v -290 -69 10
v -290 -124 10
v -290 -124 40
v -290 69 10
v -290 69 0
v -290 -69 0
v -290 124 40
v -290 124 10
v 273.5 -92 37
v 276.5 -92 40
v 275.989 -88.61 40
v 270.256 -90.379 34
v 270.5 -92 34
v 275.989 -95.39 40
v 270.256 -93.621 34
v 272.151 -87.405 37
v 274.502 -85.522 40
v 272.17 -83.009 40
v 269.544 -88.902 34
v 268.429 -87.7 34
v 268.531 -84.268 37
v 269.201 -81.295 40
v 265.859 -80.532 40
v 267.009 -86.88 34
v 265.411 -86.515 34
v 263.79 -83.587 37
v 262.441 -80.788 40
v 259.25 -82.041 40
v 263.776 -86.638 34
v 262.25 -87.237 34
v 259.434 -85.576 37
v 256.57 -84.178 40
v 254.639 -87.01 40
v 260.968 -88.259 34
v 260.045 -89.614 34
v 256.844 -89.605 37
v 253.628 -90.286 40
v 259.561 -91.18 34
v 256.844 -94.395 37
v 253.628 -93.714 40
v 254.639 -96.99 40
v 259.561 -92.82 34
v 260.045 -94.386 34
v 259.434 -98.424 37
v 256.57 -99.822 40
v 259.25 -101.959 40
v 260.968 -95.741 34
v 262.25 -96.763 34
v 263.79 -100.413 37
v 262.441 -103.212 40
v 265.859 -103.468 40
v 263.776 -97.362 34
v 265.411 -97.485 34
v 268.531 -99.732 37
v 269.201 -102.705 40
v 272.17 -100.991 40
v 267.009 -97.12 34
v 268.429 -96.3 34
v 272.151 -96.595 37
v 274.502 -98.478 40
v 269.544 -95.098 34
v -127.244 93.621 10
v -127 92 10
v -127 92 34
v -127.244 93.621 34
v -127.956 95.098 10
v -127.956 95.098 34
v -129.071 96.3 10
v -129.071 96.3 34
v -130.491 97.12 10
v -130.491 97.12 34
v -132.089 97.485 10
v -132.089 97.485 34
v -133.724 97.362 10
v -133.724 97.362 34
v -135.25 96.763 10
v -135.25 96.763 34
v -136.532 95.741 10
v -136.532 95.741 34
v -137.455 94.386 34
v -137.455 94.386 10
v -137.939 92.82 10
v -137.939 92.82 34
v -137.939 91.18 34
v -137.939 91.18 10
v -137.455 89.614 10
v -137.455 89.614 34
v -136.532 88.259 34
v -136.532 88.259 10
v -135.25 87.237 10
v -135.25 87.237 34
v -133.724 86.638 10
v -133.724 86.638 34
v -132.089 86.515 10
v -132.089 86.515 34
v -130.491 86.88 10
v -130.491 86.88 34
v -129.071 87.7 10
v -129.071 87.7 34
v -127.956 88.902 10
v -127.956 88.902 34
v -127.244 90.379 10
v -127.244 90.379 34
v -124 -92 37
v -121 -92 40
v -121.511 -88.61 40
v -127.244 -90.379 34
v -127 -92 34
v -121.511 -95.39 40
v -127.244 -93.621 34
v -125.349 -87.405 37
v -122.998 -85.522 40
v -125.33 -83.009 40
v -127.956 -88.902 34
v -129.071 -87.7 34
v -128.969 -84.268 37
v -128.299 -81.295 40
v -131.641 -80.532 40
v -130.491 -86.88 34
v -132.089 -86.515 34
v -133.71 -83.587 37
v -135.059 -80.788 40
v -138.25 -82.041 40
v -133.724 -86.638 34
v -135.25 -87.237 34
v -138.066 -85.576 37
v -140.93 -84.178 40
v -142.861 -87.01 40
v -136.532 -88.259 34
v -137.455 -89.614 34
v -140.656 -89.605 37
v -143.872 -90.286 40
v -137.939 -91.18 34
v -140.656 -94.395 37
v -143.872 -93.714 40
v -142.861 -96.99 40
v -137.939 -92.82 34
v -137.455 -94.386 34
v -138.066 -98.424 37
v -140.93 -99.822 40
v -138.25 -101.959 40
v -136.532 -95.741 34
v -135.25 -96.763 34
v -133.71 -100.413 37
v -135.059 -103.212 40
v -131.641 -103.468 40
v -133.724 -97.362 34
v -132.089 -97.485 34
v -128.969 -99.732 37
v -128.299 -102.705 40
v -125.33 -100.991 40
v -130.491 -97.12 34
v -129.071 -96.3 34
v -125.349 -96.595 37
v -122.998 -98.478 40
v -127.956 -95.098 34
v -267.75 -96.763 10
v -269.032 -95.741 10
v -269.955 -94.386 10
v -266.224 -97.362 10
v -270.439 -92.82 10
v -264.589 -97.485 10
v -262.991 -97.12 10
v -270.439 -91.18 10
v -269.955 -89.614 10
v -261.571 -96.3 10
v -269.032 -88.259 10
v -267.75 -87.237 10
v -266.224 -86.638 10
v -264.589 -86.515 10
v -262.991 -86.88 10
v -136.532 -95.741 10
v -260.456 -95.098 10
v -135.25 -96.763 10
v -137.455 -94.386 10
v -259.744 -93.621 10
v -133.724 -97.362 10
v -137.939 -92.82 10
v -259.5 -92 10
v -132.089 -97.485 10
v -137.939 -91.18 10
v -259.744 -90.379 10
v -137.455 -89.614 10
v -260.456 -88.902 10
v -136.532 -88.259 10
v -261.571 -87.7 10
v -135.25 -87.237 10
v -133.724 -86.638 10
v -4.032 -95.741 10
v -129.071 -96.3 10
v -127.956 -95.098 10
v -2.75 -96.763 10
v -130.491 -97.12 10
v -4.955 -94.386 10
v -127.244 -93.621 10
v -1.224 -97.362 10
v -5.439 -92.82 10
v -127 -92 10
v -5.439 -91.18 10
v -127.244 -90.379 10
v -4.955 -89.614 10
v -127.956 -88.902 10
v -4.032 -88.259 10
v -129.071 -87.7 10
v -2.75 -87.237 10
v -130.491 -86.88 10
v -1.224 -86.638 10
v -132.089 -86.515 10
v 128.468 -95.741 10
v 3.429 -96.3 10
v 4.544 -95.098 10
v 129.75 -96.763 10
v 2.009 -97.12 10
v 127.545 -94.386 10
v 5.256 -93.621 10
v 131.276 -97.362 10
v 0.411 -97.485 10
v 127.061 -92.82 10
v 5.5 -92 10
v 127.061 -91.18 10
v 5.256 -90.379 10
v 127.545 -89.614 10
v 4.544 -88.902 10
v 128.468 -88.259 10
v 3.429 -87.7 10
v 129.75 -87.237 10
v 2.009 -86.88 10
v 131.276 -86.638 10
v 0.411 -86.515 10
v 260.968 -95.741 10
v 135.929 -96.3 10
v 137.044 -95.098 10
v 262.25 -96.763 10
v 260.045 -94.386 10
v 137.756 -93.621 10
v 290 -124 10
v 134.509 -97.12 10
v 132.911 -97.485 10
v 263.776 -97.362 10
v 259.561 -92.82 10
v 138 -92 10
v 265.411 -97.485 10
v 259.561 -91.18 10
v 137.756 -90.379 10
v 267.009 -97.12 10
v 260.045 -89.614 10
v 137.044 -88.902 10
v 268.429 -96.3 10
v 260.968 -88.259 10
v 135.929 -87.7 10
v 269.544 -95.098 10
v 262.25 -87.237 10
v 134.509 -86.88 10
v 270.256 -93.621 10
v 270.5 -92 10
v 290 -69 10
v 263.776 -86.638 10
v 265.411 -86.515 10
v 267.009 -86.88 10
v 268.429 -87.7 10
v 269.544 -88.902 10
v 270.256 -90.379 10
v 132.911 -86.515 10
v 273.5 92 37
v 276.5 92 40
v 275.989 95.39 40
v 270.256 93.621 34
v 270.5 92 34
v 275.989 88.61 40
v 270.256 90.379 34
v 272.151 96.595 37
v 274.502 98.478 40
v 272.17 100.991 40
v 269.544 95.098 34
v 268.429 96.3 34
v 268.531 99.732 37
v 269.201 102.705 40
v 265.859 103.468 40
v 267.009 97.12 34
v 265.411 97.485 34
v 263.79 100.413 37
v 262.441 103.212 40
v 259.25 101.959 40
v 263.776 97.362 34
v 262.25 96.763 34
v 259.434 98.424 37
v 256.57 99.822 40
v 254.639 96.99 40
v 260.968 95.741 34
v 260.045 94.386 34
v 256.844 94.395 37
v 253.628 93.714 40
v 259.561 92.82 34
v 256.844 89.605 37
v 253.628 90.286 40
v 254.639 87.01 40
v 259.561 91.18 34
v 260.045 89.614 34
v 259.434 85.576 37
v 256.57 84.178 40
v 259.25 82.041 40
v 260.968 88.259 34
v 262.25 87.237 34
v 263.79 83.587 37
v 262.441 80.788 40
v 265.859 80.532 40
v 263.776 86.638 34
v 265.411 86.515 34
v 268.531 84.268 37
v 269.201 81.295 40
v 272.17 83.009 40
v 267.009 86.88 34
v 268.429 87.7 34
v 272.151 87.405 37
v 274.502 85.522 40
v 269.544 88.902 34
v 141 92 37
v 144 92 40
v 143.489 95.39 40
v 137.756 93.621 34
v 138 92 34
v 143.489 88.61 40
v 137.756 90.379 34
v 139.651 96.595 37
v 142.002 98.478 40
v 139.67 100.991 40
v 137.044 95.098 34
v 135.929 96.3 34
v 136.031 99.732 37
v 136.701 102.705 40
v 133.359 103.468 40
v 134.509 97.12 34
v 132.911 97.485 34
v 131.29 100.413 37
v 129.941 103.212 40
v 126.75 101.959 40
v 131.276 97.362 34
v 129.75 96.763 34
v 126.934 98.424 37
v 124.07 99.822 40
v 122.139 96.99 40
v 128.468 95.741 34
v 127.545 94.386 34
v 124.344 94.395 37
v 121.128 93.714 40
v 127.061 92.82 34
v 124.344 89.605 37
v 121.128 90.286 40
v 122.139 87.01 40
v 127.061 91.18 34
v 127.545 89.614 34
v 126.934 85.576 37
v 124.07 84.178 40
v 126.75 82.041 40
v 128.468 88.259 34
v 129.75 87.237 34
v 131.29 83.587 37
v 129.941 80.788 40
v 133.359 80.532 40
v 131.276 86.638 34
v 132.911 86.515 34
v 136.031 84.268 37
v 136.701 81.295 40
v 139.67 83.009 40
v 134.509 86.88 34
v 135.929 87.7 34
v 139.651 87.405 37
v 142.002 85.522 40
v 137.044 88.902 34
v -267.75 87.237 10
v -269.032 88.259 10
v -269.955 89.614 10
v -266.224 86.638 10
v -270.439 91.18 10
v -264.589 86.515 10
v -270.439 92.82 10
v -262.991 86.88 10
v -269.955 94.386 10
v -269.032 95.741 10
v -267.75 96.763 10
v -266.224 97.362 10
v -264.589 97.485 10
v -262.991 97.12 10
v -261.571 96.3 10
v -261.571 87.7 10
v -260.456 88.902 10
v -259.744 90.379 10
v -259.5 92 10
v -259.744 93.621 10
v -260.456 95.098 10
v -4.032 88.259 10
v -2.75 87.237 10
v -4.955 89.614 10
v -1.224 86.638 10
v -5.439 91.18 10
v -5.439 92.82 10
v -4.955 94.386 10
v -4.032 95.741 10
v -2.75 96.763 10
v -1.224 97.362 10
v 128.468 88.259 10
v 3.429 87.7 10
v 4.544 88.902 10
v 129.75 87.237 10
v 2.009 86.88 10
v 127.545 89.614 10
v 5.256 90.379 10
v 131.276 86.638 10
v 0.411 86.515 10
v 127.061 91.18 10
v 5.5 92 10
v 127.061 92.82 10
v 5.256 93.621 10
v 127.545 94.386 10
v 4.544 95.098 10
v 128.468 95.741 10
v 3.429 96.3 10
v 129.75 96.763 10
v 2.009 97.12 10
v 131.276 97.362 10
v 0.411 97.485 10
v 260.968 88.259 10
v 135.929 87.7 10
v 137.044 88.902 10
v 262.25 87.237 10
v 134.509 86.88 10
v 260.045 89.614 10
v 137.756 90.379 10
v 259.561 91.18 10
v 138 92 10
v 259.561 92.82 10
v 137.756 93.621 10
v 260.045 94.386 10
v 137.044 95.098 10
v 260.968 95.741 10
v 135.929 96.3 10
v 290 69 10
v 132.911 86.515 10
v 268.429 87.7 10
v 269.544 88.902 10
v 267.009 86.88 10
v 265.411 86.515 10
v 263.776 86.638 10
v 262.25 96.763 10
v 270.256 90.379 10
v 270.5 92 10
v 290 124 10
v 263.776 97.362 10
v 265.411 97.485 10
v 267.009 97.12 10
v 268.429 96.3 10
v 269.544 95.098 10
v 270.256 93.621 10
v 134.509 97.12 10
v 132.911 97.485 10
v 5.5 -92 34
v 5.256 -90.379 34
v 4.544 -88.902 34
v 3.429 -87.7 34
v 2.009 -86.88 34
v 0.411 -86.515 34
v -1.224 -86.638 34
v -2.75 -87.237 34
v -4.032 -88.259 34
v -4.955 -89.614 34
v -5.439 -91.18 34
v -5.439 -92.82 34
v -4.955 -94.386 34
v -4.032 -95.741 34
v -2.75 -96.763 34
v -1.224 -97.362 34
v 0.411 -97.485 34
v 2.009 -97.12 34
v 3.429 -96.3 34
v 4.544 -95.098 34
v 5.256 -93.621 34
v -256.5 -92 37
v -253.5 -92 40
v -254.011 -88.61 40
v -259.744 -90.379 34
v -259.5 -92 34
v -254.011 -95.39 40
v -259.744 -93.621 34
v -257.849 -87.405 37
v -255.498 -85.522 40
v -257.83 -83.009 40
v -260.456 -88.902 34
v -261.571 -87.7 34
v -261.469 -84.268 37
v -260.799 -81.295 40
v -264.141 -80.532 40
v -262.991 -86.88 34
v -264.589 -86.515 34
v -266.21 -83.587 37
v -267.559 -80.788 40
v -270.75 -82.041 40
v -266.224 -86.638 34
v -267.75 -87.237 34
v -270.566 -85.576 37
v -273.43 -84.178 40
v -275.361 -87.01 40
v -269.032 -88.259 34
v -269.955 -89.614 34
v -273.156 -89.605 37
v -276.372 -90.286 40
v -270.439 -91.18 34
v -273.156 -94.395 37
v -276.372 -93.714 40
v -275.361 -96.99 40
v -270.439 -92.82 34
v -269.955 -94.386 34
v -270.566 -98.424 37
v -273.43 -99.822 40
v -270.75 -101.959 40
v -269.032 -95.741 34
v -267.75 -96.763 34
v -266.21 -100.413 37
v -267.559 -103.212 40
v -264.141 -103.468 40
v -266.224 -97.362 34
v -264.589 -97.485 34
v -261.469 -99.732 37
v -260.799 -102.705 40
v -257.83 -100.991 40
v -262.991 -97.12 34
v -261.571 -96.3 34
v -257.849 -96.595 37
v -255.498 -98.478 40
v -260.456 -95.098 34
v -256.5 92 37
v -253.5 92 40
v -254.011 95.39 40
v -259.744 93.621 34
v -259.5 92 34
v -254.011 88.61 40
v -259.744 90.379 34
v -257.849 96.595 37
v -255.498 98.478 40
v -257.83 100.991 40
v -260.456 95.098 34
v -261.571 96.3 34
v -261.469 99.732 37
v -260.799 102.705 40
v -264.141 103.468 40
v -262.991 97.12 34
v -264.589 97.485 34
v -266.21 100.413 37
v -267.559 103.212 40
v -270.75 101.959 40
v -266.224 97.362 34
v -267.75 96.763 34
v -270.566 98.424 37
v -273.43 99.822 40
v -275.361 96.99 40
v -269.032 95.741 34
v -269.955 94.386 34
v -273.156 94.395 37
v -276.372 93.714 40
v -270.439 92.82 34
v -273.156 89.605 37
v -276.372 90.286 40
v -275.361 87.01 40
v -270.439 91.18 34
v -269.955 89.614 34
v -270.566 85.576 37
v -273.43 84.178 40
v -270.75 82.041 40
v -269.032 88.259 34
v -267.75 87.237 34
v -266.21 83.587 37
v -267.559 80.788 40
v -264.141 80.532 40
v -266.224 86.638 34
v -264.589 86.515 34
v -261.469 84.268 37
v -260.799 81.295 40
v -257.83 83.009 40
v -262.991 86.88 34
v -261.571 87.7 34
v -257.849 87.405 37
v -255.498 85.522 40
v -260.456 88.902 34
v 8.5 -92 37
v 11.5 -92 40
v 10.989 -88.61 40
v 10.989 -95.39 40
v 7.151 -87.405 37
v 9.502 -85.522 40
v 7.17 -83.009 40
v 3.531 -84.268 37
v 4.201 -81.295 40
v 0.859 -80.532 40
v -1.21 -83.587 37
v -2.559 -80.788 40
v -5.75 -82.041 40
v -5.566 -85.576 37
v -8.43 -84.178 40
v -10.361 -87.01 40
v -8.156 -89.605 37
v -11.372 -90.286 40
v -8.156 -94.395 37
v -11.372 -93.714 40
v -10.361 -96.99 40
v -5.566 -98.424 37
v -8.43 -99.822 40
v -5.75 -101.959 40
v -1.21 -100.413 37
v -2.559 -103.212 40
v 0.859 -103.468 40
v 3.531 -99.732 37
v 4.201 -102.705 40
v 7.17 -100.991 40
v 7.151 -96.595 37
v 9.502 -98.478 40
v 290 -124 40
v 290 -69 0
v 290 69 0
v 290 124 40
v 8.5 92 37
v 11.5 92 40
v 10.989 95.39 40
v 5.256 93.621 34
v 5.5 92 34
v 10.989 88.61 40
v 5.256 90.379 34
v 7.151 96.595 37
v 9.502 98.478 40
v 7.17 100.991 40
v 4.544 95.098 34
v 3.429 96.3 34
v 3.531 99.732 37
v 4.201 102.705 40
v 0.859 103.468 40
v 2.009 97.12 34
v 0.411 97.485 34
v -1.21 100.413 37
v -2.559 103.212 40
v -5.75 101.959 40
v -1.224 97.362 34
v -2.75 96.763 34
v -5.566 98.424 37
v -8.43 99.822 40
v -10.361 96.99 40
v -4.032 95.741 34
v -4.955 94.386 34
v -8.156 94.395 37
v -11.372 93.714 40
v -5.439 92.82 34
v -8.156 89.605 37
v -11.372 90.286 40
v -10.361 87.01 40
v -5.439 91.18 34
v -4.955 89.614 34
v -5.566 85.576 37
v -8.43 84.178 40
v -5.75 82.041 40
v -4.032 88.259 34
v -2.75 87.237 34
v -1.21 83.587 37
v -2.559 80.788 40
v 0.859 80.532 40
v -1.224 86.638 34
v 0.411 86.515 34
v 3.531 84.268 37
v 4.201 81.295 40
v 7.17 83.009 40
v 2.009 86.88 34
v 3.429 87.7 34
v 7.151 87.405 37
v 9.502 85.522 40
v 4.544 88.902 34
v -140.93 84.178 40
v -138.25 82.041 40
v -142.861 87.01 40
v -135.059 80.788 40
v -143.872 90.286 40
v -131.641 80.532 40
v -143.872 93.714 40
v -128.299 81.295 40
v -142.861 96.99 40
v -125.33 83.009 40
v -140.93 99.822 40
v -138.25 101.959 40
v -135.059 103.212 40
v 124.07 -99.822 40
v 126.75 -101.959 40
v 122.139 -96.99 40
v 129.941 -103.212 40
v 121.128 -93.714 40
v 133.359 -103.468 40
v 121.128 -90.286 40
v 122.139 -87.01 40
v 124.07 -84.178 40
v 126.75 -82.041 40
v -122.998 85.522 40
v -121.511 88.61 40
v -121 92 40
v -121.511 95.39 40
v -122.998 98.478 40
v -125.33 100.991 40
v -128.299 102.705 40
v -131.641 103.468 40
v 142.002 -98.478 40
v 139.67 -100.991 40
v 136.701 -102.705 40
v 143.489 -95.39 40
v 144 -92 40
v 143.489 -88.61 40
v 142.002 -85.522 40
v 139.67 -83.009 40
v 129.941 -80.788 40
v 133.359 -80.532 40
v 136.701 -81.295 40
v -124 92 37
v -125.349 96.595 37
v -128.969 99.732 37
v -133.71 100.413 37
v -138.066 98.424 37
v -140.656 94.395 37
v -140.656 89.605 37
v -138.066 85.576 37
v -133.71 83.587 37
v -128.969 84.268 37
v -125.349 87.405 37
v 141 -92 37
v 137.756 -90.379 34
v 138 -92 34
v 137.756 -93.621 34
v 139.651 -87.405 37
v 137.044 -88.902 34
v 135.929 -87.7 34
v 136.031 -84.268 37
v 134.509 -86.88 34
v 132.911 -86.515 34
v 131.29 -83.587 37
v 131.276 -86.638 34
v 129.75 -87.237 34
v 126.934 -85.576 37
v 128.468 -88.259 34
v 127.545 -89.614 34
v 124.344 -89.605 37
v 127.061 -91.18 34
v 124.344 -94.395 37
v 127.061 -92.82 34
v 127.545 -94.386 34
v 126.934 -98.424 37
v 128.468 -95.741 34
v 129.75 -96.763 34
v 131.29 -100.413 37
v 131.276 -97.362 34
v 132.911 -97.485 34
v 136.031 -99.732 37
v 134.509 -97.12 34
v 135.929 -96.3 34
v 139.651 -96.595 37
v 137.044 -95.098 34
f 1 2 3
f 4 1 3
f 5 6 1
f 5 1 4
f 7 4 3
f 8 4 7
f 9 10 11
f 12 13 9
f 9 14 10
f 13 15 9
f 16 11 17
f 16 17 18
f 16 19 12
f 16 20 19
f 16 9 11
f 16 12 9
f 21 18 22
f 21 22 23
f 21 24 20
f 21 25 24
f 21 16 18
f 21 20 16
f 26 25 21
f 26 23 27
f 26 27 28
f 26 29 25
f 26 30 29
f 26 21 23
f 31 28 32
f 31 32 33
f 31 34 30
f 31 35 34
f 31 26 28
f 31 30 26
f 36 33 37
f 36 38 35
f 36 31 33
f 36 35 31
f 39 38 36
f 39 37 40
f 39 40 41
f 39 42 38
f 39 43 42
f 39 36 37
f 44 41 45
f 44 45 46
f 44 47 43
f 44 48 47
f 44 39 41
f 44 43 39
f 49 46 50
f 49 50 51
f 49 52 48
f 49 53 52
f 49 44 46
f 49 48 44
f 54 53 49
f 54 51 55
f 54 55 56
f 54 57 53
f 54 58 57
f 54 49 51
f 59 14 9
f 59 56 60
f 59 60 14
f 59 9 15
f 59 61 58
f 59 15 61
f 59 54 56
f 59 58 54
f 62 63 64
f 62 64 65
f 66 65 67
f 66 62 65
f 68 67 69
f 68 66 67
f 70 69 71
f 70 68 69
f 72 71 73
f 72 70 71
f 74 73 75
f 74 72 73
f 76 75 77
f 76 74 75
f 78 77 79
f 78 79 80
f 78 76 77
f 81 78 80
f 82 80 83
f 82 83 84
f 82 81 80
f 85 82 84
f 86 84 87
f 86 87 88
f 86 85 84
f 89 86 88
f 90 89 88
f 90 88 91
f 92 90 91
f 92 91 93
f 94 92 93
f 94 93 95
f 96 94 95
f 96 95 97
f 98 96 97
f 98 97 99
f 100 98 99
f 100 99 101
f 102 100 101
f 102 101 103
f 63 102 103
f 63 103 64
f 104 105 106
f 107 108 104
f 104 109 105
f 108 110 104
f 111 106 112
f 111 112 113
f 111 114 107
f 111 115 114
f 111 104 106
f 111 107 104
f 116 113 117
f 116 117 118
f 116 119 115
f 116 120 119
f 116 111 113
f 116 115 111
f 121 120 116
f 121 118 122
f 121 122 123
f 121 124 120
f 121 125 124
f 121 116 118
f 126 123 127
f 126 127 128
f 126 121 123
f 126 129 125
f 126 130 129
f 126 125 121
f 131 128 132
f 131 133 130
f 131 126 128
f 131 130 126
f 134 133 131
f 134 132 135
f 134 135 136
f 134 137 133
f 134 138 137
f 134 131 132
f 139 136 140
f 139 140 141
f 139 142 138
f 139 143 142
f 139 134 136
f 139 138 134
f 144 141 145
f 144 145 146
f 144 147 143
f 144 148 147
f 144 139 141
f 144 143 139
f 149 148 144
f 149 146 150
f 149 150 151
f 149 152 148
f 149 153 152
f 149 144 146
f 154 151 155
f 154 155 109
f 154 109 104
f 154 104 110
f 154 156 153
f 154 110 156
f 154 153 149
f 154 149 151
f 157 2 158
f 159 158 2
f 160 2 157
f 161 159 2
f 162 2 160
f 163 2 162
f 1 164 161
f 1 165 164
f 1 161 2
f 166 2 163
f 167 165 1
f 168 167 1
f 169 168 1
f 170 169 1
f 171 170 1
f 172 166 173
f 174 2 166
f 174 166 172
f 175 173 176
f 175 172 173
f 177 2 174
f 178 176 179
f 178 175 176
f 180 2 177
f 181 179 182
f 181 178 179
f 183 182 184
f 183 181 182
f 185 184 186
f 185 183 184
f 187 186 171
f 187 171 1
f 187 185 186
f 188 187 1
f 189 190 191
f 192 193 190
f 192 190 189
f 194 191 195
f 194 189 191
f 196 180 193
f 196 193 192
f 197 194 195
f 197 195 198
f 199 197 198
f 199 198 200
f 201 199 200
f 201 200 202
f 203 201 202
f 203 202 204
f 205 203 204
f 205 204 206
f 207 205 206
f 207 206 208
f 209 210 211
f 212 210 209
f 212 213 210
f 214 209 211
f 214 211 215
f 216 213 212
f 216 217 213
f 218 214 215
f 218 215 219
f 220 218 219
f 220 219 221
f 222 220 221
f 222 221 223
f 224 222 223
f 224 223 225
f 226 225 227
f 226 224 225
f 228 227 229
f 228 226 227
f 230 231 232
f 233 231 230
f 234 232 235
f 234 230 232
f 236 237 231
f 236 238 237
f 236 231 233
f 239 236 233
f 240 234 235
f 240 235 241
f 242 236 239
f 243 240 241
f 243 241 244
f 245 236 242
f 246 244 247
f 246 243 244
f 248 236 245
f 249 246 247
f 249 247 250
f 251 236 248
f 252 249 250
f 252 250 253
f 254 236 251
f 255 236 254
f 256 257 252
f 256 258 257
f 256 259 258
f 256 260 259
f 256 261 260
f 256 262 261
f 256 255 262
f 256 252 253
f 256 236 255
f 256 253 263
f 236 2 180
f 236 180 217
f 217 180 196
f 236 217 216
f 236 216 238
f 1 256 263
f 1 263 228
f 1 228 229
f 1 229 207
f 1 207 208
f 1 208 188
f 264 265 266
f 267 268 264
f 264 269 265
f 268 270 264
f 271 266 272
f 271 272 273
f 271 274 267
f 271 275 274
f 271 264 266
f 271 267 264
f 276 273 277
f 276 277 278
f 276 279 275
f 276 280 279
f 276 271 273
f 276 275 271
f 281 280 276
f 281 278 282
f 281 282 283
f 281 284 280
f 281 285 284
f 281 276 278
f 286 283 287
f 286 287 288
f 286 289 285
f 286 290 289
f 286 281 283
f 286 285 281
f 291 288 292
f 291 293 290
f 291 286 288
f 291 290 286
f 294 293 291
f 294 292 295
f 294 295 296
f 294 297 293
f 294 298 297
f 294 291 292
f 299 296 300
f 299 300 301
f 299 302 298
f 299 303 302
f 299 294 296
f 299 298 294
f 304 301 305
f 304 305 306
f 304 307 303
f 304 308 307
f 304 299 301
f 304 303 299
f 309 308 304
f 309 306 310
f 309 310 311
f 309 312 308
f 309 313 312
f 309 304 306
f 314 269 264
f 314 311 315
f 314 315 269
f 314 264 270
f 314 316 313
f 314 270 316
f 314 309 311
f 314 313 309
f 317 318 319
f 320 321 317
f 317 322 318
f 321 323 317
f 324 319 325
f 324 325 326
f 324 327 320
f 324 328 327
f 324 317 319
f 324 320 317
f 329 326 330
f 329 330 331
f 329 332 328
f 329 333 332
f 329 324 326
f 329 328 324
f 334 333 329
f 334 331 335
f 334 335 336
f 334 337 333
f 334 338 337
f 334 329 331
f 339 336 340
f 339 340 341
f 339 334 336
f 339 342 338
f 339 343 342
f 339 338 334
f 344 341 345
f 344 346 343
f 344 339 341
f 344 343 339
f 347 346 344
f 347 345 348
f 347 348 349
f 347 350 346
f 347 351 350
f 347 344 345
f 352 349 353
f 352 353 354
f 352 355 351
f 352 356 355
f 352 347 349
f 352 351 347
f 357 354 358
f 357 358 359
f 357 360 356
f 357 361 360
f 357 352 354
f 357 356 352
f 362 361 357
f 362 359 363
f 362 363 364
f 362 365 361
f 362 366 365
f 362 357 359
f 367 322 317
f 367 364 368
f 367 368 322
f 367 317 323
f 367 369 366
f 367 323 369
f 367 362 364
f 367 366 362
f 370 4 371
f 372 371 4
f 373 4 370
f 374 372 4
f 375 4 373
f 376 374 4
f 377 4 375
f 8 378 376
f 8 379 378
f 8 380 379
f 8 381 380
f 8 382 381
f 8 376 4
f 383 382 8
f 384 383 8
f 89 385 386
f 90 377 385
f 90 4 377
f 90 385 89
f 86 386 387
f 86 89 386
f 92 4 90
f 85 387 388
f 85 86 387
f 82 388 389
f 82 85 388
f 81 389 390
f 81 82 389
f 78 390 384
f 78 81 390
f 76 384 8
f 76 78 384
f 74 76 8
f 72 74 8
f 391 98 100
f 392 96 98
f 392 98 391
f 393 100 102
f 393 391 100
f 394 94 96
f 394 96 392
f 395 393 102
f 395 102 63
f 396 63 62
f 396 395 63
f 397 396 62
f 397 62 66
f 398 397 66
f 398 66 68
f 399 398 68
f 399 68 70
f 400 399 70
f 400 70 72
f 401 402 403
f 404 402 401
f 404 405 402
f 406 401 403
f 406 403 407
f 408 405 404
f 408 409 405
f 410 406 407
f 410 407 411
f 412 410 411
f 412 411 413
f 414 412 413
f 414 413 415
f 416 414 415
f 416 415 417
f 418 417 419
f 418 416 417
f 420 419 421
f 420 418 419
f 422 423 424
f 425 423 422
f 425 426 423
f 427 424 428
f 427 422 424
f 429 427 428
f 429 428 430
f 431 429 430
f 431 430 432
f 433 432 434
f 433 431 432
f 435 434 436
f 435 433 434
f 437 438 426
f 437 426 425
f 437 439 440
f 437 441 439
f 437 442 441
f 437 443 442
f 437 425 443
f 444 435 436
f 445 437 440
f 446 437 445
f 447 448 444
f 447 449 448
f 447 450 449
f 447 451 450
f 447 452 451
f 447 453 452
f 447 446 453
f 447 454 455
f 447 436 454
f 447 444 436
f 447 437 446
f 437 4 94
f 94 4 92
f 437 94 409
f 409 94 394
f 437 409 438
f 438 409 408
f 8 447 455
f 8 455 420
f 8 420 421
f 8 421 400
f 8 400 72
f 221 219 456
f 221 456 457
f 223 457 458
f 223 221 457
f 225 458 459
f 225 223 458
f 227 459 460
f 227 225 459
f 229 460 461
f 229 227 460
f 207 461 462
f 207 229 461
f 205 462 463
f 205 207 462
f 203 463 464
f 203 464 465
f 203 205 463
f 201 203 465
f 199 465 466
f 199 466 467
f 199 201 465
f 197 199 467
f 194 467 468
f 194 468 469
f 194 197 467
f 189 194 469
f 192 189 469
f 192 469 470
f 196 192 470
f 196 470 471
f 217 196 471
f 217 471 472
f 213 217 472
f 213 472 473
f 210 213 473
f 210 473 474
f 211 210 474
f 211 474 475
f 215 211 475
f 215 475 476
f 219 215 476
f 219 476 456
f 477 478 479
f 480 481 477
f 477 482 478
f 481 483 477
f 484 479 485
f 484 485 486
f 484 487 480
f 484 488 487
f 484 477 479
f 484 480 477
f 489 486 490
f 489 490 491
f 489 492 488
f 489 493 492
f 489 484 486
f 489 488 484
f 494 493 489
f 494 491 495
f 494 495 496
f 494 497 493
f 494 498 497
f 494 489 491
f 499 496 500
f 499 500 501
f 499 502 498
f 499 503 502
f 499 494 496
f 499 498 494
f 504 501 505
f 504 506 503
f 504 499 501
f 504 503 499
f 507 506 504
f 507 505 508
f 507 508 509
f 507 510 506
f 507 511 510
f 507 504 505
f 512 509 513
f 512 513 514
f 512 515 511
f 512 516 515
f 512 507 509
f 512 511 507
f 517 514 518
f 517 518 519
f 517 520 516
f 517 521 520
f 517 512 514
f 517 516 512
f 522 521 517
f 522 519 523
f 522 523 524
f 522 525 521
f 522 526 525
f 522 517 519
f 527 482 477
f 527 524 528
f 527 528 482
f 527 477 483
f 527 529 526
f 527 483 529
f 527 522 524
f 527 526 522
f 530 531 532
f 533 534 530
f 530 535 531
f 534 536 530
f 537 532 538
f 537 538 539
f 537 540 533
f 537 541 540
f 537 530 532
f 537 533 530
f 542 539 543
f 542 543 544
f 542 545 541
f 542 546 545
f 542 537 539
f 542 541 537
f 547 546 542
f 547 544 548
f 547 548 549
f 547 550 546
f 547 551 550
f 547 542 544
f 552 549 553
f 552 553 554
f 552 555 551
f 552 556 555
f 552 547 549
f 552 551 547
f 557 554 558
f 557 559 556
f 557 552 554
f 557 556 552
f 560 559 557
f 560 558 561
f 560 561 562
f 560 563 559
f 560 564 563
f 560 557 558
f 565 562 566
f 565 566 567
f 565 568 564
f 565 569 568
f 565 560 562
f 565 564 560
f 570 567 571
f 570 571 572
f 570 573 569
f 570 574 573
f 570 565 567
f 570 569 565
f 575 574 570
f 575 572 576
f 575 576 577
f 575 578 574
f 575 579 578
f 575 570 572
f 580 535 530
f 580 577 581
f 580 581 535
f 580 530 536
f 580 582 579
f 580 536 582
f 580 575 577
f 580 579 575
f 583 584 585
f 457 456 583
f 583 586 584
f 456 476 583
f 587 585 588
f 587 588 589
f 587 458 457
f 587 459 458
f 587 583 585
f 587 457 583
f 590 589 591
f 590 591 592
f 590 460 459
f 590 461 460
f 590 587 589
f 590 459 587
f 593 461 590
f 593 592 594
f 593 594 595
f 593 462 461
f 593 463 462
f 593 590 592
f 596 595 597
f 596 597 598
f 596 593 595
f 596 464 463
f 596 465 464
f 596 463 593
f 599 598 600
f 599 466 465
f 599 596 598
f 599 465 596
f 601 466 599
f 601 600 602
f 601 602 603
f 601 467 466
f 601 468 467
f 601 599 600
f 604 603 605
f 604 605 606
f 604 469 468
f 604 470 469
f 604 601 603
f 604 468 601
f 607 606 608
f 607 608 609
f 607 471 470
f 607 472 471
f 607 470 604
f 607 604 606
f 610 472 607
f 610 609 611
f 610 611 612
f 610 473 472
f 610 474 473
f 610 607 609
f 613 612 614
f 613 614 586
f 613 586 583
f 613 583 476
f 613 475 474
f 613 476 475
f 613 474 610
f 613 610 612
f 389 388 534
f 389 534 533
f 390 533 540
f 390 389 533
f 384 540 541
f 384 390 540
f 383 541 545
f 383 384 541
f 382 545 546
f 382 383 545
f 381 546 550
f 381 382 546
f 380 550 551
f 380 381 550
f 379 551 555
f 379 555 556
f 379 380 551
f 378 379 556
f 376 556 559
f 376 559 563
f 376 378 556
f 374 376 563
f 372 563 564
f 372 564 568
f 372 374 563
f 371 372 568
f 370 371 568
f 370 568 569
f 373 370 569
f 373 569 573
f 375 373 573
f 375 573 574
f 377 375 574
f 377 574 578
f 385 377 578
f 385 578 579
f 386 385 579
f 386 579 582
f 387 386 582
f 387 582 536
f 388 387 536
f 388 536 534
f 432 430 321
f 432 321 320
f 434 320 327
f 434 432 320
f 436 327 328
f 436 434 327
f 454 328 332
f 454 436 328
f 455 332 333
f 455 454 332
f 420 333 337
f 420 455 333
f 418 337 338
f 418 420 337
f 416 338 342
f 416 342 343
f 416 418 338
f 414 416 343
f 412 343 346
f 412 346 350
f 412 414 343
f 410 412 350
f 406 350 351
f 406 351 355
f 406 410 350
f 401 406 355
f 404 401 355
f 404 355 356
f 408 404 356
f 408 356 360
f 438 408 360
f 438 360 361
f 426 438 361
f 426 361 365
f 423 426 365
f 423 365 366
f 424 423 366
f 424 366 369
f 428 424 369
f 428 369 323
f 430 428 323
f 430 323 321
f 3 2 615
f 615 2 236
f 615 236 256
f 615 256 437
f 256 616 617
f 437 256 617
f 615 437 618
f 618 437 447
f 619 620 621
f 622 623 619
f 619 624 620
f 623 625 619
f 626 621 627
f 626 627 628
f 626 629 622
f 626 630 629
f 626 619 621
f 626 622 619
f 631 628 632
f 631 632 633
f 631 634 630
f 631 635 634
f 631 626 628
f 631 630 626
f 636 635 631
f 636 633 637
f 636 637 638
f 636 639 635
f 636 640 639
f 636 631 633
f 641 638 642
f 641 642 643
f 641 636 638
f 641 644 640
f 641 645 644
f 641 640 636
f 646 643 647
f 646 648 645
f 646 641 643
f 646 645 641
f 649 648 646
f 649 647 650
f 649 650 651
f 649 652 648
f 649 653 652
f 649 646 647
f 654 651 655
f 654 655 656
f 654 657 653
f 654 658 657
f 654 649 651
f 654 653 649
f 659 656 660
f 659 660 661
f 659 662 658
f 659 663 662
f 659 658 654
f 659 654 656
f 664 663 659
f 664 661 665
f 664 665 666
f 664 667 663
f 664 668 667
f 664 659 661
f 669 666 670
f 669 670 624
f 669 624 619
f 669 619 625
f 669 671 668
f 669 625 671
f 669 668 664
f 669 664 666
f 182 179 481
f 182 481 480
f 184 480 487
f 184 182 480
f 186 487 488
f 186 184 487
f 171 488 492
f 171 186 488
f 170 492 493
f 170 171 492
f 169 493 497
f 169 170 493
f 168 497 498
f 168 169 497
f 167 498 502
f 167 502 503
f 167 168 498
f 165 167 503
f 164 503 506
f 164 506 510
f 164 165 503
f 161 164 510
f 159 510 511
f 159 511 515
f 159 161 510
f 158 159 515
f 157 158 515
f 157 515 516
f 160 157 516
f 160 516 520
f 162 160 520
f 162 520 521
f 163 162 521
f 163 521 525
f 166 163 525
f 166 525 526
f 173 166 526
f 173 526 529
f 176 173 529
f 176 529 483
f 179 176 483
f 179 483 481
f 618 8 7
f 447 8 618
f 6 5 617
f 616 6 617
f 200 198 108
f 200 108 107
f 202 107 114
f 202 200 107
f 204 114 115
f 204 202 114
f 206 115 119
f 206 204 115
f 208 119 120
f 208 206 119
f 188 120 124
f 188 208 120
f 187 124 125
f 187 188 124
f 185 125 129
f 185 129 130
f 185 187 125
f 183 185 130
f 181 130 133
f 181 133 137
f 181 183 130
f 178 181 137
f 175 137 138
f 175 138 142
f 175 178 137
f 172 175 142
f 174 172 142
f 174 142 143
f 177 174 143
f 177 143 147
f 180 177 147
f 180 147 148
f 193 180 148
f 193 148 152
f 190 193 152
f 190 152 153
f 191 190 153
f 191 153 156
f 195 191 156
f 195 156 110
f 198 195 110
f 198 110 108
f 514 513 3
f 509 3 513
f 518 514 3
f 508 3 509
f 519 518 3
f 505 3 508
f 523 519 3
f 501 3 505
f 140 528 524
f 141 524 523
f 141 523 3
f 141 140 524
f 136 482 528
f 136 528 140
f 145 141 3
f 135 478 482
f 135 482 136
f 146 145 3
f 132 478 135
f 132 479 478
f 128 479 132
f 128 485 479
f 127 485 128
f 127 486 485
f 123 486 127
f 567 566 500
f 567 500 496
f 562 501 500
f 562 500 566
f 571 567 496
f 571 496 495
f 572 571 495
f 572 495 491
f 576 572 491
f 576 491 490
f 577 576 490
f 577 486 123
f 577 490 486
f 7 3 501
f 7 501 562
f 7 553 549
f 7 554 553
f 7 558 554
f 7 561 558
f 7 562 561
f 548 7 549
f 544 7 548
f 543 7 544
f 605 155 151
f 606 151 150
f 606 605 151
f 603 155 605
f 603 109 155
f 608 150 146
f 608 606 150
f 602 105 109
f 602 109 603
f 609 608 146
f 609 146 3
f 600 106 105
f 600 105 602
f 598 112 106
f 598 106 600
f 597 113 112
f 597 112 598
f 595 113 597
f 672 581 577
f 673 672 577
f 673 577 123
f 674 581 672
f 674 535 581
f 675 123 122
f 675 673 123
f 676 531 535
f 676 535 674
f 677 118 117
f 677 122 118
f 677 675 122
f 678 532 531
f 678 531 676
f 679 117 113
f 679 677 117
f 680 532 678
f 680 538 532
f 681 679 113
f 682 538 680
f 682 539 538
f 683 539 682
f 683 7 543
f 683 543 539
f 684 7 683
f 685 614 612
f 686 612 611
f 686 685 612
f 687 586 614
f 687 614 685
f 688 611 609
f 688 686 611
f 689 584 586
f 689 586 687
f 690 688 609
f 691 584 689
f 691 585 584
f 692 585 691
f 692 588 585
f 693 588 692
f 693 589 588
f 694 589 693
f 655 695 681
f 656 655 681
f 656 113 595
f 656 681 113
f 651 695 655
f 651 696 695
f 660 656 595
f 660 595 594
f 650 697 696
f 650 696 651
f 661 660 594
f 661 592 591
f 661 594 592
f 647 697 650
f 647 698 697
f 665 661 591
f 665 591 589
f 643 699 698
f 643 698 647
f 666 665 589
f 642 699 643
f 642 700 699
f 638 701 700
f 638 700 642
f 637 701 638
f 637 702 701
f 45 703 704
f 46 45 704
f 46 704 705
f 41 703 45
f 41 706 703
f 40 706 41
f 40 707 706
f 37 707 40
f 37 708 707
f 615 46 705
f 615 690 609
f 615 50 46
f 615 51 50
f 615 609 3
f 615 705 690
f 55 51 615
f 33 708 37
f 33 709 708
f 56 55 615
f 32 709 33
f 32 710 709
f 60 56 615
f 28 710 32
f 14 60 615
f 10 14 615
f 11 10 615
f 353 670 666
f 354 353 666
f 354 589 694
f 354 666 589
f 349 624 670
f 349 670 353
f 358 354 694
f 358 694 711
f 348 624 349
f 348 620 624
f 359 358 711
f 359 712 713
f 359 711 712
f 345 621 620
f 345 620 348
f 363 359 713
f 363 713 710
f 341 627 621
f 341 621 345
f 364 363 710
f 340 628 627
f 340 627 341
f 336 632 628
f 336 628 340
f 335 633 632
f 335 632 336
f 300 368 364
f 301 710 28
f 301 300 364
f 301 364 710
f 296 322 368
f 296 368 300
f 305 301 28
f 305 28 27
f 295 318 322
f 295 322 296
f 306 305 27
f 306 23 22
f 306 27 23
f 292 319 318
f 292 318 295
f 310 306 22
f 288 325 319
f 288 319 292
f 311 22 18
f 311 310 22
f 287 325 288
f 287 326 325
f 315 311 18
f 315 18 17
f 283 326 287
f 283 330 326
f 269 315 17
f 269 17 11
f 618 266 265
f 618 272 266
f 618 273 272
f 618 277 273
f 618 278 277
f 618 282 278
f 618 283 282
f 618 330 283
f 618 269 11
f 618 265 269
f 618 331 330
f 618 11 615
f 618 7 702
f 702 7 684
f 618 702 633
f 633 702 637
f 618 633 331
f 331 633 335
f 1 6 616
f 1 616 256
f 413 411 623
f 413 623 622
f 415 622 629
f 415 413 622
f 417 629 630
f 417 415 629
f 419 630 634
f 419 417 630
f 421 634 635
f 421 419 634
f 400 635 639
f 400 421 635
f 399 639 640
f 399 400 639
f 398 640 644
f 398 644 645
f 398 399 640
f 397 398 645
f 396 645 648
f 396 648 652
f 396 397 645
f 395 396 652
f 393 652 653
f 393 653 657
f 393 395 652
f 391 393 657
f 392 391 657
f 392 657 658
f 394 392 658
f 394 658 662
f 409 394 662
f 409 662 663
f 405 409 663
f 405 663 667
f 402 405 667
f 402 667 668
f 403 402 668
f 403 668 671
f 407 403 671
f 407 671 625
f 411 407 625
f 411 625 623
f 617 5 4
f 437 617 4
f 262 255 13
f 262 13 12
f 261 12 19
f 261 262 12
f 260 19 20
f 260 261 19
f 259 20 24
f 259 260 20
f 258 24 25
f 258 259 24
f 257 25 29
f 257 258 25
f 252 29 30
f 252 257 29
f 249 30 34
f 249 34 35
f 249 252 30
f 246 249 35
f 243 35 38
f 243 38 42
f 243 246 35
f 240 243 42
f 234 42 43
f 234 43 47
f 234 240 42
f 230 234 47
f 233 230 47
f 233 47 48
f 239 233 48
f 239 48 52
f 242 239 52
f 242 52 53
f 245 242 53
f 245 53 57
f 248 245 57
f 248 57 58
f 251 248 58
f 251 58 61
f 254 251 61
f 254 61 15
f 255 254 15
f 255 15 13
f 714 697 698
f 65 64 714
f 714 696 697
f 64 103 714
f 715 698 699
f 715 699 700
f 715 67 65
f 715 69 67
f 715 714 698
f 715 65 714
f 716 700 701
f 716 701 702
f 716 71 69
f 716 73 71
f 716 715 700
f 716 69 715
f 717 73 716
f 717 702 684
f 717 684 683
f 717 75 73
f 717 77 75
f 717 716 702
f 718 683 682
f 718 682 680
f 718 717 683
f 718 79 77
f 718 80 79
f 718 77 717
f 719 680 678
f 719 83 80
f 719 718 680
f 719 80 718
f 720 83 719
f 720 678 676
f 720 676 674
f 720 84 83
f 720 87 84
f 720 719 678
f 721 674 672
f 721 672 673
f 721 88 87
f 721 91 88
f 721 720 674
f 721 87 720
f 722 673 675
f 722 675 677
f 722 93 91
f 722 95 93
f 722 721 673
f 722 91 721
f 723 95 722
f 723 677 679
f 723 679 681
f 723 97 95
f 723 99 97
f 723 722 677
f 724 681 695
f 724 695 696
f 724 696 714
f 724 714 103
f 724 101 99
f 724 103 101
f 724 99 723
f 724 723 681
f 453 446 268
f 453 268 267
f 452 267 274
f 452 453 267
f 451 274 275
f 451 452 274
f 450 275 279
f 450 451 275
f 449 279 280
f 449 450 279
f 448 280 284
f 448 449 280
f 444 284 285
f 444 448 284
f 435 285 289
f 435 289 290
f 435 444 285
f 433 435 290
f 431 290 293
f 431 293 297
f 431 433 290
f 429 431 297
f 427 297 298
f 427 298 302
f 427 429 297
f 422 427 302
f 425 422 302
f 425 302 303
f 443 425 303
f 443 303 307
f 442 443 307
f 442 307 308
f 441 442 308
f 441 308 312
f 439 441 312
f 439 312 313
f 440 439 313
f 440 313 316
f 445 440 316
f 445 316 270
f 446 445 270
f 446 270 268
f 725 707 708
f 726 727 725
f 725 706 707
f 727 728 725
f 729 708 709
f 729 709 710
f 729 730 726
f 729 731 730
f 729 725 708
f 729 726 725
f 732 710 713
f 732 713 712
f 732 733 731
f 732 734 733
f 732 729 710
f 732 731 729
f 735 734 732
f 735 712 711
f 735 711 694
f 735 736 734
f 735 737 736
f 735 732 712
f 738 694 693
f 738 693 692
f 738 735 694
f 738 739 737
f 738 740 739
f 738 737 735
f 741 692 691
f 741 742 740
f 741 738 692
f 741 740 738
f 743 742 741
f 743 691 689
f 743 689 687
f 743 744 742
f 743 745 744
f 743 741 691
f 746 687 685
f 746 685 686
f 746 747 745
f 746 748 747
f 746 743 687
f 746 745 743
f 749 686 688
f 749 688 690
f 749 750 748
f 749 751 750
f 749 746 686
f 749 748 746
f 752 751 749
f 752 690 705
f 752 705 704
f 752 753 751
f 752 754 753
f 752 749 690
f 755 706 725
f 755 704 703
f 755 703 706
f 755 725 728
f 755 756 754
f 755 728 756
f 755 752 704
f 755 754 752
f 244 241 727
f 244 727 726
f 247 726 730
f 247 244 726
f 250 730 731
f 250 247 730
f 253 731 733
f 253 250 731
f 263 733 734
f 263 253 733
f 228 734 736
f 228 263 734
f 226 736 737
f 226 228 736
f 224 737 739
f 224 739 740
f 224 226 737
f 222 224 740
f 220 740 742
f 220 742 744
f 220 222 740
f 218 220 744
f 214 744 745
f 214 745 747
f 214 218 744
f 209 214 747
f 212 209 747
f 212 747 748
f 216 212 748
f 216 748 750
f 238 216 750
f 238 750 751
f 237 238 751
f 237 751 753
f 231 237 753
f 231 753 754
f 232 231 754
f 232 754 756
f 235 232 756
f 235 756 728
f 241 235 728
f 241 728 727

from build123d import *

# Parameters (mm, degrees)
F0_W     = 580
F0_H     = 248
F0_R     = 5.5
F1_DEPTH = 40
F2_W     = 55
F2_H     = 10
F3_DEPTH = 580.001
F4_SIZE2 = 6
F4_SIZE  = 6


with BuildPart() as f1:
    # F0 (on Top) → F1 (new body)
    with BuildSketch(Plane.XY):
        Rectangle(F0_W, F0_H)
        with Locations((-265, -92)):
            Circle(F0_R, mode=Mode.SUBTRACT)
        with Locations((-132.5, -92)):
            Circle(F0_R, mode=Mode.SUBTRACT)
        with Locations((0, -92)):
            Circle(F0_R, mode=Mode.SUBTRACT)
        with Locations((132.5, -92)):
            Circle(F0_R, mode=Mode.SUBTRACT)
        with Locations((265, -92)):
            Circle(F0_R, mode=Mode.SUBTRACT)
        with Locations((-265, 92)):
            Circle(F0_R, mode=Mode.SUBTRACT)
        with Locations((-132.5, 92)):
            Circle(F0_R, mode=Mode.SUBTRACT)
        with Locations((0, 92)):
            Circle(F0_R, mode=Mode.SUBTRACT)
        with Locations((132.5, 92)):
            Circle(F0_R, mode=Mode.SUBTRACT)
        with Locations((265, 92)):
            Circle(F0_R, mode=Mode.SUBTRACT)
    extrude(amount=F1_DEPTH)

    # F2 (on face) → F3 (cut, through all)
    with BuildSketch(Plane.YZ.offset(290)):
        with Locations((96.5, 5)):
            Rectangle(F2_W, F2_H)
        with Locations((-96.5, 5)):
            Rectangle(F2_W, F2_H)
    extrude(amount=-F3_DEPTH, mode=Mode.SUBTRACT)

    # F4
    f4_edges = [f1.edges().sort_by_distance(p)[0] for p in [
        (259.5, 92, 40),
        (127, 92, 40),
        (259.5, -92, 40),
        (127, -92, 40),
        (-5.5, -92, 40),
        (-5.5, 92, 40),
        (-138, -92, 40),
        (-138, 92, 40),
        (-270.5, 92, 40),
        (-270.5, -92, 40),
    ]]
    chamfer(f4_edges, length=F4_SIZE, length2=F4_SIZE2)


solid = f1.part
